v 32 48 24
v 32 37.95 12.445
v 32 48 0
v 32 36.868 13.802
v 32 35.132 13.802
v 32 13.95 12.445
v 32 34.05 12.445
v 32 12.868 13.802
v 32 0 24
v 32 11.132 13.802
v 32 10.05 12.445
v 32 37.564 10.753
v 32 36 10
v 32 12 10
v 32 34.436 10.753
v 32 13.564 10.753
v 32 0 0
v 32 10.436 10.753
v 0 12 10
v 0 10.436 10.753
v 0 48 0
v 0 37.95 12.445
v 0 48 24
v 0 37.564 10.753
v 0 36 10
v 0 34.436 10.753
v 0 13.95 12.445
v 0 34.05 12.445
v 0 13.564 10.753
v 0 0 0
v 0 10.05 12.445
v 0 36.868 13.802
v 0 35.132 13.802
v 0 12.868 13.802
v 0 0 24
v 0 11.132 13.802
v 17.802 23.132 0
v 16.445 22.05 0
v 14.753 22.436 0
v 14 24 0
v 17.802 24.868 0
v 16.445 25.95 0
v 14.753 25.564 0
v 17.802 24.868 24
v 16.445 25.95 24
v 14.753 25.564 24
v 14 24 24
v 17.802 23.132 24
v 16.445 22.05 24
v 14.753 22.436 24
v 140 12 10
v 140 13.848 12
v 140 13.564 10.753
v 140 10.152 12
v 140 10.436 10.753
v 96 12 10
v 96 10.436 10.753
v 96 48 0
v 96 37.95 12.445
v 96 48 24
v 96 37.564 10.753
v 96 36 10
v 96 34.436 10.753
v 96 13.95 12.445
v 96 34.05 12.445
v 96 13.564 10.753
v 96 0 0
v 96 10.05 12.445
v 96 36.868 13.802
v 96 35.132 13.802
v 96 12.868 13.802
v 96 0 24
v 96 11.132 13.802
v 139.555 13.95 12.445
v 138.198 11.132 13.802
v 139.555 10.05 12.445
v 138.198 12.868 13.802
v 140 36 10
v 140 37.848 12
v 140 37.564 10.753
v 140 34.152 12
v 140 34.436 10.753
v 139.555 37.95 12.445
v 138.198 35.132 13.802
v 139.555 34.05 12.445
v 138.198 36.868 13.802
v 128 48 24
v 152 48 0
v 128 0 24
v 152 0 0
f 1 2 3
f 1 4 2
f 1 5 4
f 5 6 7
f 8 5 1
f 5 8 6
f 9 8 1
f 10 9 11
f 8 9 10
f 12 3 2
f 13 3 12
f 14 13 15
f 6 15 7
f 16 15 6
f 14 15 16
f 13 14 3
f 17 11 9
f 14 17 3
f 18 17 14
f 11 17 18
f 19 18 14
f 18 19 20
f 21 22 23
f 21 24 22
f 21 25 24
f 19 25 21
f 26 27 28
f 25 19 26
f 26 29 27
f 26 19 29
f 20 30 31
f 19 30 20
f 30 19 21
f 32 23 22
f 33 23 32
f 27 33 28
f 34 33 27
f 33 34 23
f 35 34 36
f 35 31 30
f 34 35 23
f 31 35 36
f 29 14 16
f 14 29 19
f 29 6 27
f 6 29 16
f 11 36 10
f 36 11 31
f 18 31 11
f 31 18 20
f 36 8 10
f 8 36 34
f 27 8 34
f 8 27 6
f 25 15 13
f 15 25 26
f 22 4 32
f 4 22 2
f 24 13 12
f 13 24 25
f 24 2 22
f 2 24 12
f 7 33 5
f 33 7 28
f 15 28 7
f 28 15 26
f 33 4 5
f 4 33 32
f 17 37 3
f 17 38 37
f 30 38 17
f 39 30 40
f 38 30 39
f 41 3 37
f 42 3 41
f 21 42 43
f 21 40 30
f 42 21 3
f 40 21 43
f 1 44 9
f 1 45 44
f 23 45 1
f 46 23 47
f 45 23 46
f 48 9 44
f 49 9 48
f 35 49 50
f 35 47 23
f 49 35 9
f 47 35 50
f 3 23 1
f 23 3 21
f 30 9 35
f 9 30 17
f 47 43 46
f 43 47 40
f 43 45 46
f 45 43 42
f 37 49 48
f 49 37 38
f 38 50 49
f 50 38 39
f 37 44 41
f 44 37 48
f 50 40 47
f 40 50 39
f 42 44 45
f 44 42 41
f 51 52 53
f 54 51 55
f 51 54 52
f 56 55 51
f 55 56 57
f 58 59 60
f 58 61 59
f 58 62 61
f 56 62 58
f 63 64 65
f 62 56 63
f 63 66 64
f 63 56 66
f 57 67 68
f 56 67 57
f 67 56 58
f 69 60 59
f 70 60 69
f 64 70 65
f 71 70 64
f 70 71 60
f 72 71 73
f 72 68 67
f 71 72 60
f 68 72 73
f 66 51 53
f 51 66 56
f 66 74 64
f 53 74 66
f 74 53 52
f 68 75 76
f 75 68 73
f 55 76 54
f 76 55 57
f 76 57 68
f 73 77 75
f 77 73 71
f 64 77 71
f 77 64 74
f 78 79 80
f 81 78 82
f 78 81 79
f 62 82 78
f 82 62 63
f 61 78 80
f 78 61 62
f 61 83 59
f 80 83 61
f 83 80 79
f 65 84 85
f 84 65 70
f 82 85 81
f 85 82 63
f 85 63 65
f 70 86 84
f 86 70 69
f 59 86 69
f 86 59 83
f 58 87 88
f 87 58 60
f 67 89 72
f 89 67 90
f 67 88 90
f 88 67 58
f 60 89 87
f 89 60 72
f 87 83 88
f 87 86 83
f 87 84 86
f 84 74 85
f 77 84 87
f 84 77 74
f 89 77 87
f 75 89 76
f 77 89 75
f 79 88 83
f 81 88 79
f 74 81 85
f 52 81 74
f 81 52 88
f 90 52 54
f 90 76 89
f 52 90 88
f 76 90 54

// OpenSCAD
scale = 32;

firWidth = (3 / 4) * scale;
firHeight = (3 / 2) * scale;

size = 1 * scale;
rad = 2;
holeDist = firWidth / 2;

module strip(firLen)
{
    cube([firWidth,firHeight,firLen]);
}

module strip45(firLen)
{
    points = [
    [  0,  0,  0 ],  //0
    [  0,  firHeight,  0 ],  //1
    [  0,  0,  firWidth ],  //2
    [  0,  firHeight,  firWidth ],  //3
    [  firLen - firWidth,  0,  firWidth ],  //4
    [  firLen - firWidth,  firHeight,  firWidth ],  //5
    [  firLen,  0,  0 ],  //6
    [  firLen,  firHeight,  0 ]]; //7
  
    faces = [
    [0,1,3,2], //back
    [6,7,1,0],  // bottom
    [4,2,3,5], // top
    [6,4,5,7],  // front
    [0,2,4,6],  // right
    [5,3,1,7]];  // left
  
    polyhedron( points, faces );
}

module drillHole(len)
{
    translate([0,0,firWidth / 2])
    {
        rotate([0,90,0])
        {
            cylinder(len, rad, rad);
        }
    }
}

module holes(len)
{
    translate([0,holeDist,0])
    {
        drillHole(len);
    }
    translate([0,firHeight - holeDist,0])
    {
        drillHole(len);
    }  
}

module hole(len)
{
    translate([len / 2,firHeight / 2,firWidth])
    {
        rotate([0,90,0])
        {
            drillHole(firWidth);
        }
    }
}

module drillGuide()
{
    difference()
    {
        translate([0,0,firWidth])
        {
            rotate([0,90,0])
            {
                strip(size);
            }
        }
        holes(size);
    }
}

module drillGuide45()
{
    difference()
    {
        strip45(size + firWidth);
        holes(size + (firWidth / 2));
    }
}

difference()
{
    drillGuide();
    hole(size - firWidth);
}

translate([size * 3,0,0])
{
    drillGuide45();
}
